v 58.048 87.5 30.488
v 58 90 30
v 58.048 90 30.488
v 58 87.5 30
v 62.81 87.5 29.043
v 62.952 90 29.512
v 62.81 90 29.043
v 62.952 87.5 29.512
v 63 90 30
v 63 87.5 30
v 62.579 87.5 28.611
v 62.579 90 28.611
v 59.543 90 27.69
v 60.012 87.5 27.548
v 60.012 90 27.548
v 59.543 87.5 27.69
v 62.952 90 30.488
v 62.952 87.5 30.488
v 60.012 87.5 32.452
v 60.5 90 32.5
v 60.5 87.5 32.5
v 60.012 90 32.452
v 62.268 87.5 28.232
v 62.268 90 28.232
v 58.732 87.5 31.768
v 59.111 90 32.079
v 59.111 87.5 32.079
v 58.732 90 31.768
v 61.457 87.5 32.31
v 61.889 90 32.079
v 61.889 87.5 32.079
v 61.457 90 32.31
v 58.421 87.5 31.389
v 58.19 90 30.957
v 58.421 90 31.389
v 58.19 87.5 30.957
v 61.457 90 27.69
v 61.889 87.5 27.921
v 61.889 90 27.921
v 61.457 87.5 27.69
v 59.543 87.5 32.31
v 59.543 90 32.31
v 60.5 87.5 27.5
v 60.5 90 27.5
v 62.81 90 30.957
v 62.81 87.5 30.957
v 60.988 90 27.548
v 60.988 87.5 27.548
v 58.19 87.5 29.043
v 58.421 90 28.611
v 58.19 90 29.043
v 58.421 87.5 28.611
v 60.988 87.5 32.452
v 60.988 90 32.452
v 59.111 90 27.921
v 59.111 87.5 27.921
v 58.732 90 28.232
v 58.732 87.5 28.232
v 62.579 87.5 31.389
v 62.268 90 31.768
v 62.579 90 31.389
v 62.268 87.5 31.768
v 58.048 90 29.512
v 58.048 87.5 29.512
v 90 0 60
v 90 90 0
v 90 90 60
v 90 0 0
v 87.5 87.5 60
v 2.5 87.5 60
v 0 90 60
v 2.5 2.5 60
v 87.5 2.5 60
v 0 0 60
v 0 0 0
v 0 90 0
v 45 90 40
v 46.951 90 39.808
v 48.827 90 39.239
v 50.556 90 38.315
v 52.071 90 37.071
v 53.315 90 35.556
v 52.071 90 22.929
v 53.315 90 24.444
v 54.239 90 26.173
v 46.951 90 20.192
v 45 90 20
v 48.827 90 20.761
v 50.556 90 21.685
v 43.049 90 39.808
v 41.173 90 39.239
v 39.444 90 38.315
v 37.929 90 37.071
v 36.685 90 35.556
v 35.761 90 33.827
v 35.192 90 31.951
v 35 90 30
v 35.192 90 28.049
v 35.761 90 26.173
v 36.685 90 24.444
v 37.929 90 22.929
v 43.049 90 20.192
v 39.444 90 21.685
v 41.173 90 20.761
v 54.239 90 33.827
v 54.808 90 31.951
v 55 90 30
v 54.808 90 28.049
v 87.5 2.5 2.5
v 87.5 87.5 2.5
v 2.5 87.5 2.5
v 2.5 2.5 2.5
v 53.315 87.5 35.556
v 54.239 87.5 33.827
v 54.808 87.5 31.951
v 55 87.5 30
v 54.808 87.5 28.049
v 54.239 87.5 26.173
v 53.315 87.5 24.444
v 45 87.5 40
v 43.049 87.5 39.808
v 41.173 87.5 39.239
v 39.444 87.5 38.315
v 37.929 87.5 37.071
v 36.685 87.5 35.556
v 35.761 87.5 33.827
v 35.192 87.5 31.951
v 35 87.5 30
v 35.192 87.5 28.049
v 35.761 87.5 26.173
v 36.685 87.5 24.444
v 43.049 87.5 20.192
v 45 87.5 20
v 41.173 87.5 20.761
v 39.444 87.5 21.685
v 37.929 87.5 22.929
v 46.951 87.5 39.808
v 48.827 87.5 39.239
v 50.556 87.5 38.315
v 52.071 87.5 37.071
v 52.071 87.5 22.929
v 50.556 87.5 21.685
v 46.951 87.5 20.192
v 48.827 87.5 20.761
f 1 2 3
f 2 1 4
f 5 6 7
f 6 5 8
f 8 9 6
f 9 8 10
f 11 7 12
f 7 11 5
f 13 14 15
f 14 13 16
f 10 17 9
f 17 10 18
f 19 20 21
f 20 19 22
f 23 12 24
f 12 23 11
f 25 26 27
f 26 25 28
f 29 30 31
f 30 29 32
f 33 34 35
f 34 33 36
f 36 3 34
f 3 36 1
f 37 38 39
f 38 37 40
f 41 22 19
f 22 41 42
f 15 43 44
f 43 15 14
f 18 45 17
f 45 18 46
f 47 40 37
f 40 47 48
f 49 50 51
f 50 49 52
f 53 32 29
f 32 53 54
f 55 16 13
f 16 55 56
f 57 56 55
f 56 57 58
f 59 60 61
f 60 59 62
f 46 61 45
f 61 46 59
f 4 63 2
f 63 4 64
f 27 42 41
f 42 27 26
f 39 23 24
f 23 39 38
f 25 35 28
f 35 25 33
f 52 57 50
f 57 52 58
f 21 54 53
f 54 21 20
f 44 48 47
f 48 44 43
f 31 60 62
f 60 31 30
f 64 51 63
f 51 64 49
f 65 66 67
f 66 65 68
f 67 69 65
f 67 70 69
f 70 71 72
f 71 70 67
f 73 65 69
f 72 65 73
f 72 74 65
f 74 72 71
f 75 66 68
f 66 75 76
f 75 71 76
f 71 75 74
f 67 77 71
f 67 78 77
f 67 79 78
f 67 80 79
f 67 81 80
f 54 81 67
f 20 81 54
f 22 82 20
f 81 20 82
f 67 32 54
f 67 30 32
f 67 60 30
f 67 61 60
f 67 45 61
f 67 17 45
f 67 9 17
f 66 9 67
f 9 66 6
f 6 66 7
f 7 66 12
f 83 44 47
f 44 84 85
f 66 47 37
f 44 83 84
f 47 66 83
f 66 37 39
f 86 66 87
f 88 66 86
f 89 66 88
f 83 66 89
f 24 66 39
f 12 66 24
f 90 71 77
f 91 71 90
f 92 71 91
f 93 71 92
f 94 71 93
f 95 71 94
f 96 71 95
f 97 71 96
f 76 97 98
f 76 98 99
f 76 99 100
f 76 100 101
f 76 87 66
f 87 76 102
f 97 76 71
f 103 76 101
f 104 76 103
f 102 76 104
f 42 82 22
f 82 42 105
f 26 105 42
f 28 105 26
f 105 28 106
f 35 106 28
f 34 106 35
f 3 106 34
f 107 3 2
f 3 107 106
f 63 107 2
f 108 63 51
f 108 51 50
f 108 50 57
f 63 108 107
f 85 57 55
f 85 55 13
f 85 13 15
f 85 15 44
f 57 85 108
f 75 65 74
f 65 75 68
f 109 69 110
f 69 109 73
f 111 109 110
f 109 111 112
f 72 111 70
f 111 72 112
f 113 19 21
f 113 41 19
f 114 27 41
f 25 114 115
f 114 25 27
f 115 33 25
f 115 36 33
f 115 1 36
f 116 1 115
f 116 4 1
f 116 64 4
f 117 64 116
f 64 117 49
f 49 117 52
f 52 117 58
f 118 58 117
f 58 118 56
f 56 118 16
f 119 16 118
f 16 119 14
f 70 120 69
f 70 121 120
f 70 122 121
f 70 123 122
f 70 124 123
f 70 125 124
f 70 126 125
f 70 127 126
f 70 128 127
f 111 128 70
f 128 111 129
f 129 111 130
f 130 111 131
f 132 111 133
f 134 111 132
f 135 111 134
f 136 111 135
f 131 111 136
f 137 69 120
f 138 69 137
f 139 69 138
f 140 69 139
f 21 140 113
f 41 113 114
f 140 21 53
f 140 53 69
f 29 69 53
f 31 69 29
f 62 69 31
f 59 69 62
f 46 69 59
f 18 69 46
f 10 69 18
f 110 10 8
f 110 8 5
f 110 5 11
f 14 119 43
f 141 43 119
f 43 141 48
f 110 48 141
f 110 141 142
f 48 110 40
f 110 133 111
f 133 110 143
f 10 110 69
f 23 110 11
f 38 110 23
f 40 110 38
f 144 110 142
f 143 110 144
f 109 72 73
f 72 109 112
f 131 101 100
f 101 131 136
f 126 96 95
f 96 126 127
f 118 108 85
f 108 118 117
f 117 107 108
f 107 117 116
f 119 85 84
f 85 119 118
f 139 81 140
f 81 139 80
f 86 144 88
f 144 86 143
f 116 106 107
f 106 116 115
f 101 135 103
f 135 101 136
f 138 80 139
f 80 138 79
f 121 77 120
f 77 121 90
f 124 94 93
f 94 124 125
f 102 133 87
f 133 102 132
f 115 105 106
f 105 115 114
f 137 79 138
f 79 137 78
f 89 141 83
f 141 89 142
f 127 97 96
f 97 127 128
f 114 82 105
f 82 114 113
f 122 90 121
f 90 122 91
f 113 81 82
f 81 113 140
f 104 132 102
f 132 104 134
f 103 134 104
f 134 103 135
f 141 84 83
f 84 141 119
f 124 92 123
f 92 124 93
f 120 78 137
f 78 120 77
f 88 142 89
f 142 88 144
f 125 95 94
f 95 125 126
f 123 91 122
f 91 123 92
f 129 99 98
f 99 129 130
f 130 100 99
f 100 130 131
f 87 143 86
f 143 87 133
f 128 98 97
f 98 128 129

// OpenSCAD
$fn = 32;

// ----------------------------------------------------------------------
// Vent box: roundvent enclosure
// ----------------------------------------------------------------------

// --- parameters (mm) ---
box_l = 90;               // box length, X
box_w = 90;               // box width, Y
box_h = 60;               // box height, Z
wall_t = 2.5;             // shell wall thickness
vent_d = 20;              // central vent diameter
ring_d = 5;               // ring hole diameter
n_ring = 6;               // holes in the ring
ring_r = 15.5;            // ring radius

ring_step = 360 / n_ring;  // ring hole angular step

difference() {
  cube([box_l, box_w, box_h]);
  translate([wall_t, wall_t, wall_t])
    cube([box_l - 2 * wall_t, box_w - 2 * wall_t, box_h]);
  translate([box_l / 2, box_w - wall_t - 1, box_h / 2])
    rotate([-90, 0, 0]) cylinder(h = wall_t + 2, d = vent_d);
  for (i = [0 : n_ring - 1])
    translate([box_l / 2, box_w - wall_t - 1, box_h / 2])
      rotate([0, 0, i * ring_step])
        translate([ring_r, 0, 0]) rotate([-90, 0, 0])
          cylinder(h = wall_t + 2, d = ring_d);
}
